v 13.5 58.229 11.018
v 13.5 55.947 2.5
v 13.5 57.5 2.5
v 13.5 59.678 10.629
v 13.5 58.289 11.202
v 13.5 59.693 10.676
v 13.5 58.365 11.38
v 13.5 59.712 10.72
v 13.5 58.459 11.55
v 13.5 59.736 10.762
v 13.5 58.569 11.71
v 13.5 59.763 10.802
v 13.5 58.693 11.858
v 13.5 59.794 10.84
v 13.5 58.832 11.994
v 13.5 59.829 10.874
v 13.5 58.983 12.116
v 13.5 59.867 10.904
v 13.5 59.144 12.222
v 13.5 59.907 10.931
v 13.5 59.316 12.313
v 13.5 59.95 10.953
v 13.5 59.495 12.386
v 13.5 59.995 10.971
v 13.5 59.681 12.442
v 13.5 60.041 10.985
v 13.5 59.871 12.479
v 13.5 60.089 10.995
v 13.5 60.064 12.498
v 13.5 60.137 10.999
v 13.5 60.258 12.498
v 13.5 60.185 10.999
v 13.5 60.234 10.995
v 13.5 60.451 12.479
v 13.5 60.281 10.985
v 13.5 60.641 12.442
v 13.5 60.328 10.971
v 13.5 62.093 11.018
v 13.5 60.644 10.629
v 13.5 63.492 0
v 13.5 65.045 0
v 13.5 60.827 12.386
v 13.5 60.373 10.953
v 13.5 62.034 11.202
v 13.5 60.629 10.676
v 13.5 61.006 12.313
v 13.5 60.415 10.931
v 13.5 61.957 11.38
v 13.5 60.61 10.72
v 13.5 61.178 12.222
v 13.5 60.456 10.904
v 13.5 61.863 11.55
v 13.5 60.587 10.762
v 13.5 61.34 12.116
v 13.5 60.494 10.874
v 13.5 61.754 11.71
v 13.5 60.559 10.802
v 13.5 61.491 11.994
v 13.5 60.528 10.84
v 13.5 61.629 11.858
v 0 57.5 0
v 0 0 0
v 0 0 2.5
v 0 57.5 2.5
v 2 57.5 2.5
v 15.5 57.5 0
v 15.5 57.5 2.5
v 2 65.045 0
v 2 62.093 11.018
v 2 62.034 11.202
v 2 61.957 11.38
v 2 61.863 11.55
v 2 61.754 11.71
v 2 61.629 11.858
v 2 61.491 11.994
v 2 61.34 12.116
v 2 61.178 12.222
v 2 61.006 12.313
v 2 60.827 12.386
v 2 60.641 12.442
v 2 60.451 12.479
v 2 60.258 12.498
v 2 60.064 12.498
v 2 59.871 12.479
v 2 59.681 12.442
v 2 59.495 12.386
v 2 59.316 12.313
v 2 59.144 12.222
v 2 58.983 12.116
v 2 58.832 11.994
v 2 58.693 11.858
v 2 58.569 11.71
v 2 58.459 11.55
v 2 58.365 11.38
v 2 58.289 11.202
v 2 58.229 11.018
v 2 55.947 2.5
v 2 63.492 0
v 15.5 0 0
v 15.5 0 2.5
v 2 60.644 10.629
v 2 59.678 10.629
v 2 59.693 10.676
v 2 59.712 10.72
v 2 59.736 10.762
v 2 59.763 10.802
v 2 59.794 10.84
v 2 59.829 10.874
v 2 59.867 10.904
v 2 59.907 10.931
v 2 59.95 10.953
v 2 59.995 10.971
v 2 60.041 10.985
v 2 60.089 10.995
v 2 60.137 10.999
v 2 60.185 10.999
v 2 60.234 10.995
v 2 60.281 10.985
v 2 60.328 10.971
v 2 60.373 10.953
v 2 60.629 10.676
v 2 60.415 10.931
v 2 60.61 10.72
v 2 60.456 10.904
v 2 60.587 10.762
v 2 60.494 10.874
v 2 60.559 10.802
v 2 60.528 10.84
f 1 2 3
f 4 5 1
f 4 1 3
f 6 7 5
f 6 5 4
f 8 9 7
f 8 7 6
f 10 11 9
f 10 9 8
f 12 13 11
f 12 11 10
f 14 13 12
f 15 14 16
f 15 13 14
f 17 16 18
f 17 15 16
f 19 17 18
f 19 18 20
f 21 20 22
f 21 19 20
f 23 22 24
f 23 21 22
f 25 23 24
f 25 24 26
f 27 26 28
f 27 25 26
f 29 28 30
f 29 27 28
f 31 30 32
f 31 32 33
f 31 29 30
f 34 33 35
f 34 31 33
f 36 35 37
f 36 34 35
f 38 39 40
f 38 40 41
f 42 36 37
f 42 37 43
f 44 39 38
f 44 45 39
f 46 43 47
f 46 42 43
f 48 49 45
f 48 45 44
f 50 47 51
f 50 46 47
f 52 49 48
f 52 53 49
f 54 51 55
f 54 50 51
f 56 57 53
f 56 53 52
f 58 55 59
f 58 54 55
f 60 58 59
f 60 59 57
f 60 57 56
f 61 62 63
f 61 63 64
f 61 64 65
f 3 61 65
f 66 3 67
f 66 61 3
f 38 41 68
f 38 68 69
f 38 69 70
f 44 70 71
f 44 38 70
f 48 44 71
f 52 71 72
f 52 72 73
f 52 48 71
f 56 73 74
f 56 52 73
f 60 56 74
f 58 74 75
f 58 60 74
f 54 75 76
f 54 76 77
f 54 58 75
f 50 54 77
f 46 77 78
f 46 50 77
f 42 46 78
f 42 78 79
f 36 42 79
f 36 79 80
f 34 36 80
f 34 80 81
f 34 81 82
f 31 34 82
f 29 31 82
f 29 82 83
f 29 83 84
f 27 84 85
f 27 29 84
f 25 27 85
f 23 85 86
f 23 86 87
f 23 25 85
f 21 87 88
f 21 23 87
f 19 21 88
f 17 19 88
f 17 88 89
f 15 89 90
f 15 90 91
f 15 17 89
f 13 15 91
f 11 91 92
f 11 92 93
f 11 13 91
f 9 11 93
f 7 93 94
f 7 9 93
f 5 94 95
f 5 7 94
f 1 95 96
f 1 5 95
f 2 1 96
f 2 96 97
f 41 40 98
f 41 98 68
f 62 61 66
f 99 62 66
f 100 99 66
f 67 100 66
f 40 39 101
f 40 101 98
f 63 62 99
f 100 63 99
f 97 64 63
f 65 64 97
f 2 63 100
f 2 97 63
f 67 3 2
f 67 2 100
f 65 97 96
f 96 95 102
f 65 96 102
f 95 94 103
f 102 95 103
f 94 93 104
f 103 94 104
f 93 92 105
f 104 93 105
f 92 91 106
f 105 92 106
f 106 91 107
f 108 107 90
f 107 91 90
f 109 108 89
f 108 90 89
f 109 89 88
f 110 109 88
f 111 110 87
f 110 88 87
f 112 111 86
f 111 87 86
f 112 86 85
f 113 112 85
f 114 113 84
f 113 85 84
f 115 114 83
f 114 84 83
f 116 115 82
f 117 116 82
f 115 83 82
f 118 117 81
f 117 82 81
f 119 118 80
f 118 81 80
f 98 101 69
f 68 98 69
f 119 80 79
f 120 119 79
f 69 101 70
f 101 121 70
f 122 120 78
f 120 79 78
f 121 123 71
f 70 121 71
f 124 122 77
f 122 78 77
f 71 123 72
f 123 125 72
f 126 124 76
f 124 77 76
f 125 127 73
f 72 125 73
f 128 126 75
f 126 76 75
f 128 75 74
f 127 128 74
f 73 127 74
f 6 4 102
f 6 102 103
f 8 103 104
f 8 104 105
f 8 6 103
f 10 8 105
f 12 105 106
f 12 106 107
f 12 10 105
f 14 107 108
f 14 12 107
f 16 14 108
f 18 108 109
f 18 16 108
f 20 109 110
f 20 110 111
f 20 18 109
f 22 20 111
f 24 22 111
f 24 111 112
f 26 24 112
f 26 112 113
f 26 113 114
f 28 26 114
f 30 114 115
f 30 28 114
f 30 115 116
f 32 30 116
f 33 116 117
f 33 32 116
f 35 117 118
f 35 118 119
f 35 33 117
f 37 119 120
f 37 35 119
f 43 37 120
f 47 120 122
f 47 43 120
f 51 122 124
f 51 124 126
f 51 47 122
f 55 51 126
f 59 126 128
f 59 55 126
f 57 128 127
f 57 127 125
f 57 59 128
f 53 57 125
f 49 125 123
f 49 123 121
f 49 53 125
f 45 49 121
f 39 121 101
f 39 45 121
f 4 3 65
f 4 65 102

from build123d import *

# Parameters (mm, degrees)
F0_W     = 15.5
F0_H     = 57.5
F1_DEPTH = 2.5
F3_START = -2
F3_DEPTH = 11.5


with BuildPart() as f1:
    # F0 (on Top) → F1 (new body)
    with BuildSketch(Plane.XY):
        with Locations((7.75, 28.75)):
            Rectangle(F0_W, F0_H)
    extrude(amount=F1_DEPTH)

    # F2 (on face) → F3 (join)
    with BuildSketch(Plane.YZ.offset(15.5).offset(F3_START)):
        with BuildLine():
            Line((55.9470857294, 2.5), (57.5, 2.5))
            Line((57.5, 2.5), (59.6782687165, 10.6294095226))
            ThreePointArc((59.6782687165, 10.6294095226), (60.1612316297, 11), (60.6441945428, 10.6294095226))
            Line((60.6441945428, 10.6294095226), (63.4923362404, 0))
            Line((63.4923362404, 0), (65.045250511, 0))
            Line((65.045250511, 0), (62.0930832822, 11.0176380902))
            ThreePointArc((62.0930832822, 11.0176380902), (60.1612316297, 12.5), (58.2293799771, 11.0176380902))
            Line((58.2293799771, 11.0176380902), (55.9470857294, 2.5))
        make_face()
    extrude(amount=-F3_DEPTH)


solid = f1.part
